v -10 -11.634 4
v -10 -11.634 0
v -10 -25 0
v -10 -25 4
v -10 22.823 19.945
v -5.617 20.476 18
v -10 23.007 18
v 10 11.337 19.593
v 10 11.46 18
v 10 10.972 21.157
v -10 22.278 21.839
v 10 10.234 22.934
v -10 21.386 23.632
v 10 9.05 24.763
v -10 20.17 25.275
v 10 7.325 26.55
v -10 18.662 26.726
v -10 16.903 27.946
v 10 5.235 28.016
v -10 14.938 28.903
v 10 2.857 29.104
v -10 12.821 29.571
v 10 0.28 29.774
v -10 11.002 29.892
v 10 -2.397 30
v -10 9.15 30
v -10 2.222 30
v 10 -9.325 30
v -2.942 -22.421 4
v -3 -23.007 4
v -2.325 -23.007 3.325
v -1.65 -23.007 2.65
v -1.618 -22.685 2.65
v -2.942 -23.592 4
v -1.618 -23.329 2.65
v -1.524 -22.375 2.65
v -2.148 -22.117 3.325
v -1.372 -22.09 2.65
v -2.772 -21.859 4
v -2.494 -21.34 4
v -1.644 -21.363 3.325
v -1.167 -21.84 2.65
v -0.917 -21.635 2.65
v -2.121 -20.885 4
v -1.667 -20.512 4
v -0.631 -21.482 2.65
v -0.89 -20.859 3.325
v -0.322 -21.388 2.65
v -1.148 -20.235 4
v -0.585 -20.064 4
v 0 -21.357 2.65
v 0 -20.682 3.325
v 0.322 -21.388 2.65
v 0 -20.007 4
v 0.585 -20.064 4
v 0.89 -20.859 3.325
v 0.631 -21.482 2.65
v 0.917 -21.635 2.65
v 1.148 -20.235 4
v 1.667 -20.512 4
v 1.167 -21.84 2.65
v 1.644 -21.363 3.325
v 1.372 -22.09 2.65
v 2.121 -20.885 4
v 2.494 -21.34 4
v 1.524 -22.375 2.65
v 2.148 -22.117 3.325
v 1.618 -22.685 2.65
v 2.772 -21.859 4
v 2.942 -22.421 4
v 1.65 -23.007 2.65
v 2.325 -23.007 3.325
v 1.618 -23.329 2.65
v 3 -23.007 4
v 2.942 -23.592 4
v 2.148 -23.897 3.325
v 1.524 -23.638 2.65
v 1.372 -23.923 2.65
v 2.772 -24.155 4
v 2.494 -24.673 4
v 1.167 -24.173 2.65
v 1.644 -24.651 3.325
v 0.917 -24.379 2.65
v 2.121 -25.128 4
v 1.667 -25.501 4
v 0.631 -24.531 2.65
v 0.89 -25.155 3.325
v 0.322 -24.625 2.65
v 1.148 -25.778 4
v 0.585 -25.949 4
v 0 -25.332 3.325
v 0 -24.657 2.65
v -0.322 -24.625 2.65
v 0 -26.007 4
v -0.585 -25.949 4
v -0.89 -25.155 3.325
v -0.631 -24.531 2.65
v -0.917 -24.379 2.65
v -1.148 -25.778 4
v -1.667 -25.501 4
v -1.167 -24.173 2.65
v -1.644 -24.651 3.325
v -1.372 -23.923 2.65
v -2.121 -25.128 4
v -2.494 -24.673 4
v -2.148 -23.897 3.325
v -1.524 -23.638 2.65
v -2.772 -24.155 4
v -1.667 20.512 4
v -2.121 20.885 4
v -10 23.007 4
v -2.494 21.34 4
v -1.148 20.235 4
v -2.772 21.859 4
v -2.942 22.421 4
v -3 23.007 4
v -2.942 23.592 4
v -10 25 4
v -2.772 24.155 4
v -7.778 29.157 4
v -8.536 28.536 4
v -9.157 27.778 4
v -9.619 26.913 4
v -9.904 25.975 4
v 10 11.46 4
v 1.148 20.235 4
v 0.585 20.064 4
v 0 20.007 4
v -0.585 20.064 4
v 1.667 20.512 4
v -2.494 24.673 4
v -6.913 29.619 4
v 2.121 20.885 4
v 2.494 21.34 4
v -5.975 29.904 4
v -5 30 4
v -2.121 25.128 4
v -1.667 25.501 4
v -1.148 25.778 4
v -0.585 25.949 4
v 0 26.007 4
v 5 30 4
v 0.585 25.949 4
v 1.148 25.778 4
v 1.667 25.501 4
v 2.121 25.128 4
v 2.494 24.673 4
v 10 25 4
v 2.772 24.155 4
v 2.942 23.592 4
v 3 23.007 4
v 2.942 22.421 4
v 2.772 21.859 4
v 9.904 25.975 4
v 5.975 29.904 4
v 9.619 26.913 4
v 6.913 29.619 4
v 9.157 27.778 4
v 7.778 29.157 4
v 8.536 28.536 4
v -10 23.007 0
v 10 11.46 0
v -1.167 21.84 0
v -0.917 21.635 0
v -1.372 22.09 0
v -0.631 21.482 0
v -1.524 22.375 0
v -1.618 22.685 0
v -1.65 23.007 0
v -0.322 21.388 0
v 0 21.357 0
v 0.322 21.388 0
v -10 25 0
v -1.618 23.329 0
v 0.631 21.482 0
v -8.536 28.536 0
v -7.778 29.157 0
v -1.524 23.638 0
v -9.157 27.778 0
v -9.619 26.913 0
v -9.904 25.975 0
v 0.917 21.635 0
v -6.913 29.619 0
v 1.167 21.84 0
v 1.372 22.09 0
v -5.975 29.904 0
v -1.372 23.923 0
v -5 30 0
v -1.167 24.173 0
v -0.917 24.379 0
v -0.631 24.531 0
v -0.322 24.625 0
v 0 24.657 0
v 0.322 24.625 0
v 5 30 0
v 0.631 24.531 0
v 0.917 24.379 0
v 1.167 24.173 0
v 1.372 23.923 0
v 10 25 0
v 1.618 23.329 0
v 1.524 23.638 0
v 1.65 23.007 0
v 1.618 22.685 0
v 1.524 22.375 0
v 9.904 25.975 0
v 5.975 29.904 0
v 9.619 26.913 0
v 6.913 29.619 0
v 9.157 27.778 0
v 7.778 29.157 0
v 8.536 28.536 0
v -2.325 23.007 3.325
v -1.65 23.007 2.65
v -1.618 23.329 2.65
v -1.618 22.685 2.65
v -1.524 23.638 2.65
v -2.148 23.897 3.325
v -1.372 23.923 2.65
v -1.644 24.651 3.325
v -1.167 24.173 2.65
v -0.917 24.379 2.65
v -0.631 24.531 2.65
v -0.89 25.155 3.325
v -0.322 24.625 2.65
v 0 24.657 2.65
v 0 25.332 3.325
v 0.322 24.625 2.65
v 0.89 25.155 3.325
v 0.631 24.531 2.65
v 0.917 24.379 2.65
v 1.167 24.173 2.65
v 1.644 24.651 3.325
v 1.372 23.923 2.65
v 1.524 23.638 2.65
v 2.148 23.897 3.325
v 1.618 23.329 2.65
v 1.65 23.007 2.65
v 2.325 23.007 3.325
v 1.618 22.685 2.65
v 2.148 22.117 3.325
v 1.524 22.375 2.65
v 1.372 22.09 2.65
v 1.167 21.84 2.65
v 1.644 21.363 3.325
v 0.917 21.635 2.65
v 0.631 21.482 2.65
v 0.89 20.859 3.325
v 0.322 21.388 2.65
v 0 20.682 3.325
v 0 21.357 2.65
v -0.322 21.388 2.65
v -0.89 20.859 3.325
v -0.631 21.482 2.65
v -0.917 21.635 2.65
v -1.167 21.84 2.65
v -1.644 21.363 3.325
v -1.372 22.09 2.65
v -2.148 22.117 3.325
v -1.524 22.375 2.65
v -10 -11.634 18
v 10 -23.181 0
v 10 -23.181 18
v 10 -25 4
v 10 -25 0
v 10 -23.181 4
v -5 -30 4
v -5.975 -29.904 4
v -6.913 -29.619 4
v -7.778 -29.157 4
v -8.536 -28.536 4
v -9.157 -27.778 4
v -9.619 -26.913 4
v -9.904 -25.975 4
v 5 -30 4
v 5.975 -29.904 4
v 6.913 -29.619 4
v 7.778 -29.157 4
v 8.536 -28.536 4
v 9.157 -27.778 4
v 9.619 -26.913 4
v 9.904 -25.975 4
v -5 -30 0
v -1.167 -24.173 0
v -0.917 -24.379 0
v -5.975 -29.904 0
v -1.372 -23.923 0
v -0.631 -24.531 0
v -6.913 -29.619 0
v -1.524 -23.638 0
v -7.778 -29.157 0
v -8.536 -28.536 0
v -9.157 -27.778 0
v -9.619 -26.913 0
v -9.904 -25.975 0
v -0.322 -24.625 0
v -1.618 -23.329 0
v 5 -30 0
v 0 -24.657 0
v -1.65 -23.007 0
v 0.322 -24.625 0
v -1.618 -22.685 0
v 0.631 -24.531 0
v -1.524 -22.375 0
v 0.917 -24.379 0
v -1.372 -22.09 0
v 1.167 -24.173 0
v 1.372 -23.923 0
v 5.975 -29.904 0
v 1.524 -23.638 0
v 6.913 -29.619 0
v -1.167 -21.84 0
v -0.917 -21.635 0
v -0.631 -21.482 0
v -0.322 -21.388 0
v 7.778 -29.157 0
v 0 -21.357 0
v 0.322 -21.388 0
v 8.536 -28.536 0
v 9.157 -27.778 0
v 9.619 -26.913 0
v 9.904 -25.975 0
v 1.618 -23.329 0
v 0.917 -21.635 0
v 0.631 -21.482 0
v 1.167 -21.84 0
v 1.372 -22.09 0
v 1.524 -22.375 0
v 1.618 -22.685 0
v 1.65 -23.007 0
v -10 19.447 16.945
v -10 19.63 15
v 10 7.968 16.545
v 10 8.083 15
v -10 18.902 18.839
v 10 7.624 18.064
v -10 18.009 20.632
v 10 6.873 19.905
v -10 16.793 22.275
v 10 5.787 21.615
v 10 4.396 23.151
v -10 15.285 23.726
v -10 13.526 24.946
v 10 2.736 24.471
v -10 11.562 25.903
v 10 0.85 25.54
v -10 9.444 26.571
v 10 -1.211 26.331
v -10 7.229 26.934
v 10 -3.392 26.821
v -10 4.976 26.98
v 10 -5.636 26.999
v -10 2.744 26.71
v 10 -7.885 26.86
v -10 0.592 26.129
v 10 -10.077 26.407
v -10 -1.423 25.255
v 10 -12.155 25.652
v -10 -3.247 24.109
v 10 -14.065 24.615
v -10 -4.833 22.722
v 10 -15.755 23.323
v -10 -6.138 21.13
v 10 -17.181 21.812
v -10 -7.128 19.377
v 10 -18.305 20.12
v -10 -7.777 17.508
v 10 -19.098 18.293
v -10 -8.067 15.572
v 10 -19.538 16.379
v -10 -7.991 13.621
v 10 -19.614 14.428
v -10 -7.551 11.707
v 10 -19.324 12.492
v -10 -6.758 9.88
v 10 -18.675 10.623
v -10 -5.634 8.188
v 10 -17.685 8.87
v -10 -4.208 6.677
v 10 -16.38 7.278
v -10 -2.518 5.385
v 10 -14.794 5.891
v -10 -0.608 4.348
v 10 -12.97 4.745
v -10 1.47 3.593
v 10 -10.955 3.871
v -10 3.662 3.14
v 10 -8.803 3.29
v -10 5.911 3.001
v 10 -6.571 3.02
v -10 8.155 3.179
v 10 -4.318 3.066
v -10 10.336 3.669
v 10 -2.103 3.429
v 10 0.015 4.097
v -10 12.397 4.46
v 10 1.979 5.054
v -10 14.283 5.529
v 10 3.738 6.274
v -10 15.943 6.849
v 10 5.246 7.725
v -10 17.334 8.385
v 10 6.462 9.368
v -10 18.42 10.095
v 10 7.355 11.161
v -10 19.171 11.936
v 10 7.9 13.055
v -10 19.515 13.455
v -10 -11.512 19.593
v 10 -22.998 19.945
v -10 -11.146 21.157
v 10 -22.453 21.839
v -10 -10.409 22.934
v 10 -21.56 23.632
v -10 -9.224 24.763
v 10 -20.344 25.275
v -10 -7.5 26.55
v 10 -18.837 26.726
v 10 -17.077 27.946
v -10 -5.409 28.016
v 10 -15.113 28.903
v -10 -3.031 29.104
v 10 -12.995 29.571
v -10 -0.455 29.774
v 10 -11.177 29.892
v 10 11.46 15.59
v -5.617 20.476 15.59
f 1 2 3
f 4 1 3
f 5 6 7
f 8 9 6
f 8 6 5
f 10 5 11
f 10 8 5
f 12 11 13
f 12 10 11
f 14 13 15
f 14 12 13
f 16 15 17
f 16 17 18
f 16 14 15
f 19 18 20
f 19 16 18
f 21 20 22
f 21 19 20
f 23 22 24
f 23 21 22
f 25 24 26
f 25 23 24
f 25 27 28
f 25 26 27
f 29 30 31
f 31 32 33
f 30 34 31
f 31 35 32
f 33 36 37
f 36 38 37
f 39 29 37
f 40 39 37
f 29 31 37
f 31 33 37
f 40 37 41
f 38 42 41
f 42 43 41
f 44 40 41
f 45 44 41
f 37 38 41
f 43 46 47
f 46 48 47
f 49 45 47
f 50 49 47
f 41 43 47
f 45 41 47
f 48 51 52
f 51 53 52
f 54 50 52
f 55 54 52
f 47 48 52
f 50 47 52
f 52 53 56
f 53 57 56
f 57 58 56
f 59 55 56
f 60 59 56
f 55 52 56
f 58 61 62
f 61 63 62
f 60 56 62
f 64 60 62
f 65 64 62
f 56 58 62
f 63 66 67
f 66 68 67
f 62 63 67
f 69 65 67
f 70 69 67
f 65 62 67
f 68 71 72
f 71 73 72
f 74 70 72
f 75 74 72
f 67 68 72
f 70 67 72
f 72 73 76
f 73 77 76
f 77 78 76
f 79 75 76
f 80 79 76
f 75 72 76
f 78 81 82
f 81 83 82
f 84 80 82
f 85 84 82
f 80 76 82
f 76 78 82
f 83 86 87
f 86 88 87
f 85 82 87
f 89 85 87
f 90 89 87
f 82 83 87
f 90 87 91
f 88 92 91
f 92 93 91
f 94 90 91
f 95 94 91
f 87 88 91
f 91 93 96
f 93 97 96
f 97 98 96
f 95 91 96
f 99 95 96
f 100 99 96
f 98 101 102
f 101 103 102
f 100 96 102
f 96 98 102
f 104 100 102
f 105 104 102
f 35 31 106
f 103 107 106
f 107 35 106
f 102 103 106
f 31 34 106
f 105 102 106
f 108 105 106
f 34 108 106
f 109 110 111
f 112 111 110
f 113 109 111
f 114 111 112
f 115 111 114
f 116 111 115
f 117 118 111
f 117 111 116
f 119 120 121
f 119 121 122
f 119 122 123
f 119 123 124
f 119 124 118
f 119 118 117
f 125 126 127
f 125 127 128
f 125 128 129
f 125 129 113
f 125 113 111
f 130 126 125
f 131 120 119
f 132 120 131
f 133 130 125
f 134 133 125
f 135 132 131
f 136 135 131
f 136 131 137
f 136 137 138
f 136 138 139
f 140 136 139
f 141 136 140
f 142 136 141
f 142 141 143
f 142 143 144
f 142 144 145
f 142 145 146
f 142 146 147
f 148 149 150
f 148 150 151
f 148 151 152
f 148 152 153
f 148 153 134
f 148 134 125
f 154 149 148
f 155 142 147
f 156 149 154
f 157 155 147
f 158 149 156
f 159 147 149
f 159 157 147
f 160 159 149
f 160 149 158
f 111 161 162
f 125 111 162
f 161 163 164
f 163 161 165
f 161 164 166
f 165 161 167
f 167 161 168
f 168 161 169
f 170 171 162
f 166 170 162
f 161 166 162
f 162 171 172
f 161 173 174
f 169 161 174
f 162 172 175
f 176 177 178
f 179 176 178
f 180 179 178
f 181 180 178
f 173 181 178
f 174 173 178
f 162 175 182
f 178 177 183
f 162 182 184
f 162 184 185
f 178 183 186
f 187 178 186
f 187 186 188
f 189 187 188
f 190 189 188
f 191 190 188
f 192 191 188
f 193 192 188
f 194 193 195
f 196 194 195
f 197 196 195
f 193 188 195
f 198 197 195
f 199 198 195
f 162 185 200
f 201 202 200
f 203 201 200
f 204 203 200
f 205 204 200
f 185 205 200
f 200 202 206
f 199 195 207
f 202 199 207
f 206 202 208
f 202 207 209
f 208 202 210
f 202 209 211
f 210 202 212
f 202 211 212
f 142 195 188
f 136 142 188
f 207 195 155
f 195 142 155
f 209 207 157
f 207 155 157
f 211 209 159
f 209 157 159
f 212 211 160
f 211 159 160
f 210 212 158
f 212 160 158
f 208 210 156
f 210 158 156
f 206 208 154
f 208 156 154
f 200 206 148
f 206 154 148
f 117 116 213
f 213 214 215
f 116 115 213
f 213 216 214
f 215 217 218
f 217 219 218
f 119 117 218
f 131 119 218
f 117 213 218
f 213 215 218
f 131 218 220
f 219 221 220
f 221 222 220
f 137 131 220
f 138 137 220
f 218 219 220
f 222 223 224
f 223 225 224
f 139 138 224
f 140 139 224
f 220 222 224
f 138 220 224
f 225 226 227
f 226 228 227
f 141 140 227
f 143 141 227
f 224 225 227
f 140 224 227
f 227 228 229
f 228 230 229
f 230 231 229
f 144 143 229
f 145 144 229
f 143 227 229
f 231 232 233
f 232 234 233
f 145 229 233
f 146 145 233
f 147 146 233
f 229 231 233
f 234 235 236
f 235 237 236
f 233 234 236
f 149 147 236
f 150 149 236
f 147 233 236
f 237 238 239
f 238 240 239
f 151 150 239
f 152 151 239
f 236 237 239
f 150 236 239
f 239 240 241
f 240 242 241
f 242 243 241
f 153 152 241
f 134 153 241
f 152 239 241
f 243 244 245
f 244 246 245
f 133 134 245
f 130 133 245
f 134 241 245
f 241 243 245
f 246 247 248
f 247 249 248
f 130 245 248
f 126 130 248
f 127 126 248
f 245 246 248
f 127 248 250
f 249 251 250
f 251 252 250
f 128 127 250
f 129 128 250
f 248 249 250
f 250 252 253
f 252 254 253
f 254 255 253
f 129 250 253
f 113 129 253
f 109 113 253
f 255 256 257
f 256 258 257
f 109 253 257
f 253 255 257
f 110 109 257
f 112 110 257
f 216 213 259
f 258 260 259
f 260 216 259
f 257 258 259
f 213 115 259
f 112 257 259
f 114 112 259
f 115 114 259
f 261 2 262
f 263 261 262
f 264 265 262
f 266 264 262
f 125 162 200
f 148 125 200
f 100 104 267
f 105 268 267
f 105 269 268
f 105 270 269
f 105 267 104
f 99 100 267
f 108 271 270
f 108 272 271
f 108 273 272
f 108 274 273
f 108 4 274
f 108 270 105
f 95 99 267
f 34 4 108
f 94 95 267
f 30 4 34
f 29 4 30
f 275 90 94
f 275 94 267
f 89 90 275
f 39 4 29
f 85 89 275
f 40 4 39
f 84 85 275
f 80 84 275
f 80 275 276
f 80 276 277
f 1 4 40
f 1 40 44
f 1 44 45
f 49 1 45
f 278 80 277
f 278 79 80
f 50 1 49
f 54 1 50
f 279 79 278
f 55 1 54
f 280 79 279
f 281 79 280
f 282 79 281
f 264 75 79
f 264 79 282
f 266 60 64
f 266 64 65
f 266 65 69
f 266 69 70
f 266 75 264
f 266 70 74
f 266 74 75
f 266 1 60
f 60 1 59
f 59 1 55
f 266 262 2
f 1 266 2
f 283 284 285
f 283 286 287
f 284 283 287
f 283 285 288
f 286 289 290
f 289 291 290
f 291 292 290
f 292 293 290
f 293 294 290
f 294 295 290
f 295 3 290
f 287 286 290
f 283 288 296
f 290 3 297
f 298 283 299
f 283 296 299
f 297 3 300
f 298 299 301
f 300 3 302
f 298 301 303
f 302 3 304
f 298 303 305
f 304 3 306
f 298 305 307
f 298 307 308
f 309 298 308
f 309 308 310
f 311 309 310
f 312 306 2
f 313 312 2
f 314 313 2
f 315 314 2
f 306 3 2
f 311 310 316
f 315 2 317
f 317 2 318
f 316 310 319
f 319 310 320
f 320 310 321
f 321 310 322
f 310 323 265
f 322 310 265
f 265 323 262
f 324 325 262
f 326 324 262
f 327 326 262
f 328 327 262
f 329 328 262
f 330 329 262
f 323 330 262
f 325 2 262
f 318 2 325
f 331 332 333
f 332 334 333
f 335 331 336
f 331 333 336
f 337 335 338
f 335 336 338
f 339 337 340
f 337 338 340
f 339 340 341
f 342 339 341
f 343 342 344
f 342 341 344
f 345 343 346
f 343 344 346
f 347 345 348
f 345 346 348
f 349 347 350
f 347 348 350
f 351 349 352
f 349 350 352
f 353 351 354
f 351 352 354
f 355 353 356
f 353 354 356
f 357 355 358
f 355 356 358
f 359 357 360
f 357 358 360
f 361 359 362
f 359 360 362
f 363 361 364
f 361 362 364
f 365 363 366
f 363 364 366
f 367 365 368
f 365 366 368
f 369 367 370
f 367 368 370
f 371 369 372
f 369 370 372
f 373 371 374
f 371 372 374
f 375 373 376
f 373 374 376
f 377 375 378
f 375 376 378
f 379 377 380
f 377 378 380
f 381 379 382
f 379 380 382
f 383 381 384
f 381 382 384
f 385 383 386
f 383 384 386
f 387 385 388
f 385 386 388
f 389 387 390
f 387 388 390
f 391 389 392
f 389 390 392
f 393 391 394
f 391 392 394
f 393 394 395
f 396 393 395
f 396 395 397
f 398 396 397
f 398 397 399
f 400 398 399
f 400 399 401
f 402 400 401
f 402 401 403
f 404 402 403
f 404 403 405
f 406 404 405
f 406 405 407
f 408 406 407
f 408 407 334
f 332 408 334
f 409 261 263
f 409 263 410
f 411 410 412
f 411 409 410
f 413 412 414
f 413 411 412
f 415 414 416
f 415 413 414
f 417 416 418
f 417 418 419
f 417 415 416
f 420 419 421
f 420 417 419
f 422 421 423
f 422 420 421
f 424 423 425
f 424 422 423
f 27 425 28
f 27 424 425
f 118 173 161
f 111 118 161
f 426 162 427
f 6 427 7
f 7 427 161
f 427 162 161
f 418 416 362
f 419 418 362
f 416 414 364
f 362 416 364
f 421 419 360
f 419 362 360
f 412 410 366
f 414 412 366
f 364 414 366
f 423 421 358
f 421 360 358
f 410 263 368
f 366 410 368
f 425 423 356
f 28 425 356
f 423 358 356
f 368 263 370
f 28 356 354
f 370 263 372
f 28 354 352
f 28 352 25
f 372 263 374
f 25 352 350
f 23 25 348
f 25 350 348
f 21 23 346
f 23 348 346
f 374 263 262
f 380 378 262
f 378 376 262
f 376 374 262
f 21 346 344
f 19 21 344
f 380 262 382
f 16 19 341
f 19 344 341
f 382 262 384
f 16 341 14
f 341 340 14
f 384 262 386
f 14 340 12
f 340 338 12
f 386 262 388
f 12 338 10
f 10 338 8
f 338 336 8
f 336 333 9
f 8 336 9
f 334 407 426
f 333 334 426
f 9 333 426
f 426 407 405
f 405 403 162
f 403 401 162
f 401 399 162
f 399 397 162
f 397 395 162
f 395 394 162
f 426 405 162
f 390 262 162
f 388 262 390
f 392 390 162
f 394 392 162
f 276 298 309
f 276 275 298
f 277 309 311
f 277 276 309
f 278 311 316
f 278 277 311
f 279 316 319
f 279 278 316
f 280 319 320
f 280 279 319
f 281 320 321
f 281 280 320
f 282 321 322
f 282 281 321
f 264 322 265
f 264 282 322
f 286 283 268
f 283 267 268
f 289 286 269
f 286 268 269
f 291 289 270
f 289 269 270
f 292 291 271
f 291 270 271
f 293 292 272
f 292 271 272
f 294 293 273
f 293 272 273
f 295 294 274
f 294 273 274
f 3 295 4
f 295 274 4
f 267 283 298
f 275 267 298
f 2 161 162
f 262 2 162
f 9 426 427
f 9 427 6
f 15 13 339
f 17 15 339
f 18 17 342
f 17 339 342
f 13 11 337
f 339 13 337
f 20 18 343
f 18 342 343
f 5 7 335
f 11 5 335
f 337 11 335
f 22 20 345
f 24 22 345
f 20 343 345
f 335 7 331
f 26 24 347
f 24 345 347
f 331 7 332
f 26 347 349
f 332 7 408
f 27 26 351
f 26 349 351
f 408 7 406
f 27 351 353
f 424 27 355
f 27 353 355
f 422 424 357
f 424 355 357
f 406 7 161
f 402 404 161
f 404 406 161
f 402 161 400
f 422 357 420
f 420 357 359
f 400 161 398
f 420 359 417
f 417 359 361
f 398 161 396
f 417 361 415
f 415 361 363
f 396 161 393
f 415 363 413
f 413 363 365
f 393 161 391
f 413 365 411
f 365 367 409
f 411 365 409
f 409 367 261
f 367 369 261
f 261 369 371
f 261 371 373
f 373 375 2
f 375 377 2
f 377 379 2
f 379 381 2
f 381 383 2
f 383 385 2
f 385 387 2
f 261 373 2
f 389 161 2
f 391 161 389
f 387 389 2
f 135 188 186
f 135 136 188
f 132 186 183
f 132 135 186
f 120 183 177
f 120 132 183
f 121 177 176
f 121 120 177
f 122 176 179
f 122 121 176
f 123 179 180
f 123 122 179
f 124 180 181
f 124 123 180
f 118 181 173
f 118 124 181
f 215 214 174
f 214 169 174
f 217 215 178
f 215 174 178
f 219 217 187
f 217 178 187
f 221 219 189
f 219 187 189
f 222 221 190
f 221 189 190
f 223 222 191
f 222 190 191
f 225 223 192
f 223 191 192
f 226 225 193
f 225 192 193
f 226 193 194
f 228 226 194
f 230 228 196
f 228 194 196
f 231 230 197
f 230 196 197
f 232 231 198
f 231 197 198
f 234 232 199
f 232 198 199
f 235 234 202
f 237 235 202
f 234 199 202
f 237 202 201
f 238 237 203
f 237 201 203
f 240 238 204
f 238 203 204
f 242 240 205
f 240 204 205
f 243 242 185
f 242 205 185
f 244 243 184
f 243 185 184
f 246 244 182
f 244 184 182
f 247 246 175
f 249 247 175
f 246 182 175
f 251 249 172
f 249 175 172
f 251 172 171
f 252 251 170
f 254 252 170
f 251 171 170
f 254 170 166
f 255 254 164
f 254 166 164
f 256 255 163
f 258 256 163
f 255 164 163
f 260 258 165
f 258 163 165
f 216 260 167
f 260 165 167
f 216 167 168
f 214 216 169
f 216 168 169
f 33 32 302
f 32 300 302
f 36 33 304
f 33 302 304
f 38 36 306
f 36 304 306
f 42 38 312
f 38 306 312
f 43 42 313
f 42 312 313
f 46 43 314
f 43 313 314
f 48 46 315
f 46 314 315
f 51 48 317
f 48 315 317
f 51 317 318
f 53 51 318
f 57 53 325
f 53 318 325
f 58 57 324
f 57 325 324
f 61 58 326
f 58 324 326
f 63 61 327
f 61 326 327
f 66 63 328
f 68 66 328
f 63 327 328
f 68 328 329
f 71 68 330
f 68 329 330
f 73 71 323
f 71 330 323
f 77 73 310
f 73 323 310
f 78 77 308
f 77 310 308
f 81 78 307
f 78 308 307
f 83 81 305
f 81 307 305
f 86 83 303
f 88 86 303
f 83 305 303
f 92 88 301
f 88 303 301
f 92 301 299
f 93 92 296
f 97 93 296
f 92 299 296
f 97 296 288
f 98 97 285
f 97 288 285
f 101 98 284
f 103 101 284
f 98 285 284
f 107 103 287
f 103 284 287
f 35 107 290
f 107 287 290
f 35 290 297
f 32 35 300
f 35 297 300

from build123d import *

# Parameters (mm, degrees)
F1_DEPTH          = 4
F2_DEPTH          = 30
F3_W              = 18.0332418531
F3_H              = 11.783156544
F4_DEPTH          = 25
F6_R              = 12
F7_DEPTH          = 25
F7_DEPTH_BACK     = 25
F8_DEPTH          = 25
F10_D             = 3.3
F10_CSINK_D       = 6
F10_CSINK_ANGLE   = 90
F10_2_D           = 3.3
F10_2_CSINK_D     = 6
F10_2_CSINK_ANGLE = 90
F11_R             = 5
F11_2_R           = 5
F12_T1_DEPTH      = 83.0940107676
F12_T3_DEPTH      = 83.0940107676


# Not quite as in the source:
# - a fillet or chamfer that OpenCascade refuses, or shapes differently, is made with other operations: its cross-section is extruded or revolved along the edge and cut away or added


with BuildPart() as f1:
    # F0 (on Top) → F1 (new body)
    with BuildSketch(Plane.XY):
        Polygon((10, 30), (-10, 30), (-10, 23.0067708135), (10, 11.4597654297), align=None)
    extrude(amount=F1_DEPTH)

    # F10 (through all)
    with Locations(Plane.XY.offset(4)):
        with Locations((0, 23.0067708135), (0, -23.0067708135)):
            CounterSinkHole(F10_D / 2, F10_CSINK_D / 2, counter_sink_angle=F10_CSINK_ANGLE)

    # F11
    f11_edges = [f1.edges().sort_by_distance(p)[0] for p in [
        (10, 30, 2),
        (-10, 30, 2),
    ]]
    fillet(f11_edges, radius=F11_R)


with BuildPart() as f1b:
    # F0 (on Top) → F1, piece 2 (new body)
    with BuildSketch(Plane.XY):
        Polygon((10, -23.1812507217), (-10, -11.6342453379), (-10, -30), (10, -30), align=None)
    extrude(amount=F1_DEPTH)

    # F10#2 (through all)
    with Locations(Plane.XY.offset(4)):
        with Locations((0, 23.0067708135), (0, -23.0067708135)):
            CounterSinkHole(F10_2_D / 2, F10_2_CSINK_D / 2, counter_sink_angle=F10_2_CSINK_ANGLE)

    # F11#2
    f11_2_edges = [f1b.edges().sort_by_distance(p)[0] for p in [
        (-10, -30, 2),
        (10, -30, 2),
    ]]
    fillet(f11_2_edges, radius=F11_2_R)


with BuildPart() as f2:
    # F0 (on Top) → F2 (new body)
    with BuildSketch(Plane.XY):
        Polygon((10, 11.4597654297), (-10, 23.0067708135), (-10, -11.6342453379), (10, -23.1812507217), align=None)
    extrude(amount=F2_DEPTH)

    # F3 (on face) → F4 (join)
    with BuildSketch(Plane(origin=(7.4622239918, 12.9249510912, 0), x_dir=(-0.8660254038, 0.5, 0), z_dir=(0.5, 0.8660254038, 0))):
        with Locations((6.0862496035, 21.4814543724)):
            Rectangle(F3_W, F3_H)
    extrude(amount=F4_DEPTH)

    # F6 (on offset) → F7 (cut, two sides)
    with BuildSketch(Plane(origin=(2.5377760082, -1.4651856615, 0), x_dir=(0.5, 0.8660254038, 0), z_dir=(0.8660254038, -0.5, 0))) as f7_sk:
        with Locations((0, 15)):
            Circle(F6_R)
    extrude(amount=-F7_DEPTH, mode=Mode.SUBTRACT)
    extrude(f7_sk.sketch, amount=F7_DEPTH_BACK, mode=Mode.SUBTRACT)

    # F8 (cut): a face of the model
    f8_faces = [f2.faces().sort_by_distance(p)[0] for p in [
        (16.25, 22.285082977, 21.4814543724),
    ]]
    extrude(f8_faces, amount=-F8_DEPTH, mode=Mode.SUBTRACT)

    # F12: fillet of radius 12 on 2 edges, made by hand

    # F12_s2 → F12_t1 (cut)
    with BuildSketch(Plane(origin=(-28.4429861053, 16.4215656844, 0), x_dir=(0, 0, 1), z_dir=(0.8660254038, -0.5, 0))):
        with BuildLine():
            ThreePointArc((18, 15.0755520165), (26.4852813742, 11.5608333907), (30, 3.0755520165))
            Line((30, 3.0755520165), (30, 15.0755520165))
            Line((30, 15.0755520165), (18, 15.0755520165))
        make_face()
    extrude(amount=F12_T1_DEPTH, mode=Mode.SUBTRACT)

    # F12_s4 → F12_t3 (cut)
    with BuildSketch(Plane(origin=(28.5185381218, -16.4651856615, 0), x_dir=(0, 0, 1), z_dir=(-0.8660254038, 0.5, 0))):
        with BuildLine():
            ThreePointArc((18, 14.9244479835), (26.4852813742, 11.4097293577), (30, 2.9244479835))
            Line((30, 2.9244479835), (30, 14.9244479835))
            Line((30, 14.9244479835), (18, 14.9244479835))
        make_face()
    extrude(amount=F12_T3_DEPTH, mode=Mode.SUBTRACT)


solid = Compound([f1.part, f1b.part, f2.part])
